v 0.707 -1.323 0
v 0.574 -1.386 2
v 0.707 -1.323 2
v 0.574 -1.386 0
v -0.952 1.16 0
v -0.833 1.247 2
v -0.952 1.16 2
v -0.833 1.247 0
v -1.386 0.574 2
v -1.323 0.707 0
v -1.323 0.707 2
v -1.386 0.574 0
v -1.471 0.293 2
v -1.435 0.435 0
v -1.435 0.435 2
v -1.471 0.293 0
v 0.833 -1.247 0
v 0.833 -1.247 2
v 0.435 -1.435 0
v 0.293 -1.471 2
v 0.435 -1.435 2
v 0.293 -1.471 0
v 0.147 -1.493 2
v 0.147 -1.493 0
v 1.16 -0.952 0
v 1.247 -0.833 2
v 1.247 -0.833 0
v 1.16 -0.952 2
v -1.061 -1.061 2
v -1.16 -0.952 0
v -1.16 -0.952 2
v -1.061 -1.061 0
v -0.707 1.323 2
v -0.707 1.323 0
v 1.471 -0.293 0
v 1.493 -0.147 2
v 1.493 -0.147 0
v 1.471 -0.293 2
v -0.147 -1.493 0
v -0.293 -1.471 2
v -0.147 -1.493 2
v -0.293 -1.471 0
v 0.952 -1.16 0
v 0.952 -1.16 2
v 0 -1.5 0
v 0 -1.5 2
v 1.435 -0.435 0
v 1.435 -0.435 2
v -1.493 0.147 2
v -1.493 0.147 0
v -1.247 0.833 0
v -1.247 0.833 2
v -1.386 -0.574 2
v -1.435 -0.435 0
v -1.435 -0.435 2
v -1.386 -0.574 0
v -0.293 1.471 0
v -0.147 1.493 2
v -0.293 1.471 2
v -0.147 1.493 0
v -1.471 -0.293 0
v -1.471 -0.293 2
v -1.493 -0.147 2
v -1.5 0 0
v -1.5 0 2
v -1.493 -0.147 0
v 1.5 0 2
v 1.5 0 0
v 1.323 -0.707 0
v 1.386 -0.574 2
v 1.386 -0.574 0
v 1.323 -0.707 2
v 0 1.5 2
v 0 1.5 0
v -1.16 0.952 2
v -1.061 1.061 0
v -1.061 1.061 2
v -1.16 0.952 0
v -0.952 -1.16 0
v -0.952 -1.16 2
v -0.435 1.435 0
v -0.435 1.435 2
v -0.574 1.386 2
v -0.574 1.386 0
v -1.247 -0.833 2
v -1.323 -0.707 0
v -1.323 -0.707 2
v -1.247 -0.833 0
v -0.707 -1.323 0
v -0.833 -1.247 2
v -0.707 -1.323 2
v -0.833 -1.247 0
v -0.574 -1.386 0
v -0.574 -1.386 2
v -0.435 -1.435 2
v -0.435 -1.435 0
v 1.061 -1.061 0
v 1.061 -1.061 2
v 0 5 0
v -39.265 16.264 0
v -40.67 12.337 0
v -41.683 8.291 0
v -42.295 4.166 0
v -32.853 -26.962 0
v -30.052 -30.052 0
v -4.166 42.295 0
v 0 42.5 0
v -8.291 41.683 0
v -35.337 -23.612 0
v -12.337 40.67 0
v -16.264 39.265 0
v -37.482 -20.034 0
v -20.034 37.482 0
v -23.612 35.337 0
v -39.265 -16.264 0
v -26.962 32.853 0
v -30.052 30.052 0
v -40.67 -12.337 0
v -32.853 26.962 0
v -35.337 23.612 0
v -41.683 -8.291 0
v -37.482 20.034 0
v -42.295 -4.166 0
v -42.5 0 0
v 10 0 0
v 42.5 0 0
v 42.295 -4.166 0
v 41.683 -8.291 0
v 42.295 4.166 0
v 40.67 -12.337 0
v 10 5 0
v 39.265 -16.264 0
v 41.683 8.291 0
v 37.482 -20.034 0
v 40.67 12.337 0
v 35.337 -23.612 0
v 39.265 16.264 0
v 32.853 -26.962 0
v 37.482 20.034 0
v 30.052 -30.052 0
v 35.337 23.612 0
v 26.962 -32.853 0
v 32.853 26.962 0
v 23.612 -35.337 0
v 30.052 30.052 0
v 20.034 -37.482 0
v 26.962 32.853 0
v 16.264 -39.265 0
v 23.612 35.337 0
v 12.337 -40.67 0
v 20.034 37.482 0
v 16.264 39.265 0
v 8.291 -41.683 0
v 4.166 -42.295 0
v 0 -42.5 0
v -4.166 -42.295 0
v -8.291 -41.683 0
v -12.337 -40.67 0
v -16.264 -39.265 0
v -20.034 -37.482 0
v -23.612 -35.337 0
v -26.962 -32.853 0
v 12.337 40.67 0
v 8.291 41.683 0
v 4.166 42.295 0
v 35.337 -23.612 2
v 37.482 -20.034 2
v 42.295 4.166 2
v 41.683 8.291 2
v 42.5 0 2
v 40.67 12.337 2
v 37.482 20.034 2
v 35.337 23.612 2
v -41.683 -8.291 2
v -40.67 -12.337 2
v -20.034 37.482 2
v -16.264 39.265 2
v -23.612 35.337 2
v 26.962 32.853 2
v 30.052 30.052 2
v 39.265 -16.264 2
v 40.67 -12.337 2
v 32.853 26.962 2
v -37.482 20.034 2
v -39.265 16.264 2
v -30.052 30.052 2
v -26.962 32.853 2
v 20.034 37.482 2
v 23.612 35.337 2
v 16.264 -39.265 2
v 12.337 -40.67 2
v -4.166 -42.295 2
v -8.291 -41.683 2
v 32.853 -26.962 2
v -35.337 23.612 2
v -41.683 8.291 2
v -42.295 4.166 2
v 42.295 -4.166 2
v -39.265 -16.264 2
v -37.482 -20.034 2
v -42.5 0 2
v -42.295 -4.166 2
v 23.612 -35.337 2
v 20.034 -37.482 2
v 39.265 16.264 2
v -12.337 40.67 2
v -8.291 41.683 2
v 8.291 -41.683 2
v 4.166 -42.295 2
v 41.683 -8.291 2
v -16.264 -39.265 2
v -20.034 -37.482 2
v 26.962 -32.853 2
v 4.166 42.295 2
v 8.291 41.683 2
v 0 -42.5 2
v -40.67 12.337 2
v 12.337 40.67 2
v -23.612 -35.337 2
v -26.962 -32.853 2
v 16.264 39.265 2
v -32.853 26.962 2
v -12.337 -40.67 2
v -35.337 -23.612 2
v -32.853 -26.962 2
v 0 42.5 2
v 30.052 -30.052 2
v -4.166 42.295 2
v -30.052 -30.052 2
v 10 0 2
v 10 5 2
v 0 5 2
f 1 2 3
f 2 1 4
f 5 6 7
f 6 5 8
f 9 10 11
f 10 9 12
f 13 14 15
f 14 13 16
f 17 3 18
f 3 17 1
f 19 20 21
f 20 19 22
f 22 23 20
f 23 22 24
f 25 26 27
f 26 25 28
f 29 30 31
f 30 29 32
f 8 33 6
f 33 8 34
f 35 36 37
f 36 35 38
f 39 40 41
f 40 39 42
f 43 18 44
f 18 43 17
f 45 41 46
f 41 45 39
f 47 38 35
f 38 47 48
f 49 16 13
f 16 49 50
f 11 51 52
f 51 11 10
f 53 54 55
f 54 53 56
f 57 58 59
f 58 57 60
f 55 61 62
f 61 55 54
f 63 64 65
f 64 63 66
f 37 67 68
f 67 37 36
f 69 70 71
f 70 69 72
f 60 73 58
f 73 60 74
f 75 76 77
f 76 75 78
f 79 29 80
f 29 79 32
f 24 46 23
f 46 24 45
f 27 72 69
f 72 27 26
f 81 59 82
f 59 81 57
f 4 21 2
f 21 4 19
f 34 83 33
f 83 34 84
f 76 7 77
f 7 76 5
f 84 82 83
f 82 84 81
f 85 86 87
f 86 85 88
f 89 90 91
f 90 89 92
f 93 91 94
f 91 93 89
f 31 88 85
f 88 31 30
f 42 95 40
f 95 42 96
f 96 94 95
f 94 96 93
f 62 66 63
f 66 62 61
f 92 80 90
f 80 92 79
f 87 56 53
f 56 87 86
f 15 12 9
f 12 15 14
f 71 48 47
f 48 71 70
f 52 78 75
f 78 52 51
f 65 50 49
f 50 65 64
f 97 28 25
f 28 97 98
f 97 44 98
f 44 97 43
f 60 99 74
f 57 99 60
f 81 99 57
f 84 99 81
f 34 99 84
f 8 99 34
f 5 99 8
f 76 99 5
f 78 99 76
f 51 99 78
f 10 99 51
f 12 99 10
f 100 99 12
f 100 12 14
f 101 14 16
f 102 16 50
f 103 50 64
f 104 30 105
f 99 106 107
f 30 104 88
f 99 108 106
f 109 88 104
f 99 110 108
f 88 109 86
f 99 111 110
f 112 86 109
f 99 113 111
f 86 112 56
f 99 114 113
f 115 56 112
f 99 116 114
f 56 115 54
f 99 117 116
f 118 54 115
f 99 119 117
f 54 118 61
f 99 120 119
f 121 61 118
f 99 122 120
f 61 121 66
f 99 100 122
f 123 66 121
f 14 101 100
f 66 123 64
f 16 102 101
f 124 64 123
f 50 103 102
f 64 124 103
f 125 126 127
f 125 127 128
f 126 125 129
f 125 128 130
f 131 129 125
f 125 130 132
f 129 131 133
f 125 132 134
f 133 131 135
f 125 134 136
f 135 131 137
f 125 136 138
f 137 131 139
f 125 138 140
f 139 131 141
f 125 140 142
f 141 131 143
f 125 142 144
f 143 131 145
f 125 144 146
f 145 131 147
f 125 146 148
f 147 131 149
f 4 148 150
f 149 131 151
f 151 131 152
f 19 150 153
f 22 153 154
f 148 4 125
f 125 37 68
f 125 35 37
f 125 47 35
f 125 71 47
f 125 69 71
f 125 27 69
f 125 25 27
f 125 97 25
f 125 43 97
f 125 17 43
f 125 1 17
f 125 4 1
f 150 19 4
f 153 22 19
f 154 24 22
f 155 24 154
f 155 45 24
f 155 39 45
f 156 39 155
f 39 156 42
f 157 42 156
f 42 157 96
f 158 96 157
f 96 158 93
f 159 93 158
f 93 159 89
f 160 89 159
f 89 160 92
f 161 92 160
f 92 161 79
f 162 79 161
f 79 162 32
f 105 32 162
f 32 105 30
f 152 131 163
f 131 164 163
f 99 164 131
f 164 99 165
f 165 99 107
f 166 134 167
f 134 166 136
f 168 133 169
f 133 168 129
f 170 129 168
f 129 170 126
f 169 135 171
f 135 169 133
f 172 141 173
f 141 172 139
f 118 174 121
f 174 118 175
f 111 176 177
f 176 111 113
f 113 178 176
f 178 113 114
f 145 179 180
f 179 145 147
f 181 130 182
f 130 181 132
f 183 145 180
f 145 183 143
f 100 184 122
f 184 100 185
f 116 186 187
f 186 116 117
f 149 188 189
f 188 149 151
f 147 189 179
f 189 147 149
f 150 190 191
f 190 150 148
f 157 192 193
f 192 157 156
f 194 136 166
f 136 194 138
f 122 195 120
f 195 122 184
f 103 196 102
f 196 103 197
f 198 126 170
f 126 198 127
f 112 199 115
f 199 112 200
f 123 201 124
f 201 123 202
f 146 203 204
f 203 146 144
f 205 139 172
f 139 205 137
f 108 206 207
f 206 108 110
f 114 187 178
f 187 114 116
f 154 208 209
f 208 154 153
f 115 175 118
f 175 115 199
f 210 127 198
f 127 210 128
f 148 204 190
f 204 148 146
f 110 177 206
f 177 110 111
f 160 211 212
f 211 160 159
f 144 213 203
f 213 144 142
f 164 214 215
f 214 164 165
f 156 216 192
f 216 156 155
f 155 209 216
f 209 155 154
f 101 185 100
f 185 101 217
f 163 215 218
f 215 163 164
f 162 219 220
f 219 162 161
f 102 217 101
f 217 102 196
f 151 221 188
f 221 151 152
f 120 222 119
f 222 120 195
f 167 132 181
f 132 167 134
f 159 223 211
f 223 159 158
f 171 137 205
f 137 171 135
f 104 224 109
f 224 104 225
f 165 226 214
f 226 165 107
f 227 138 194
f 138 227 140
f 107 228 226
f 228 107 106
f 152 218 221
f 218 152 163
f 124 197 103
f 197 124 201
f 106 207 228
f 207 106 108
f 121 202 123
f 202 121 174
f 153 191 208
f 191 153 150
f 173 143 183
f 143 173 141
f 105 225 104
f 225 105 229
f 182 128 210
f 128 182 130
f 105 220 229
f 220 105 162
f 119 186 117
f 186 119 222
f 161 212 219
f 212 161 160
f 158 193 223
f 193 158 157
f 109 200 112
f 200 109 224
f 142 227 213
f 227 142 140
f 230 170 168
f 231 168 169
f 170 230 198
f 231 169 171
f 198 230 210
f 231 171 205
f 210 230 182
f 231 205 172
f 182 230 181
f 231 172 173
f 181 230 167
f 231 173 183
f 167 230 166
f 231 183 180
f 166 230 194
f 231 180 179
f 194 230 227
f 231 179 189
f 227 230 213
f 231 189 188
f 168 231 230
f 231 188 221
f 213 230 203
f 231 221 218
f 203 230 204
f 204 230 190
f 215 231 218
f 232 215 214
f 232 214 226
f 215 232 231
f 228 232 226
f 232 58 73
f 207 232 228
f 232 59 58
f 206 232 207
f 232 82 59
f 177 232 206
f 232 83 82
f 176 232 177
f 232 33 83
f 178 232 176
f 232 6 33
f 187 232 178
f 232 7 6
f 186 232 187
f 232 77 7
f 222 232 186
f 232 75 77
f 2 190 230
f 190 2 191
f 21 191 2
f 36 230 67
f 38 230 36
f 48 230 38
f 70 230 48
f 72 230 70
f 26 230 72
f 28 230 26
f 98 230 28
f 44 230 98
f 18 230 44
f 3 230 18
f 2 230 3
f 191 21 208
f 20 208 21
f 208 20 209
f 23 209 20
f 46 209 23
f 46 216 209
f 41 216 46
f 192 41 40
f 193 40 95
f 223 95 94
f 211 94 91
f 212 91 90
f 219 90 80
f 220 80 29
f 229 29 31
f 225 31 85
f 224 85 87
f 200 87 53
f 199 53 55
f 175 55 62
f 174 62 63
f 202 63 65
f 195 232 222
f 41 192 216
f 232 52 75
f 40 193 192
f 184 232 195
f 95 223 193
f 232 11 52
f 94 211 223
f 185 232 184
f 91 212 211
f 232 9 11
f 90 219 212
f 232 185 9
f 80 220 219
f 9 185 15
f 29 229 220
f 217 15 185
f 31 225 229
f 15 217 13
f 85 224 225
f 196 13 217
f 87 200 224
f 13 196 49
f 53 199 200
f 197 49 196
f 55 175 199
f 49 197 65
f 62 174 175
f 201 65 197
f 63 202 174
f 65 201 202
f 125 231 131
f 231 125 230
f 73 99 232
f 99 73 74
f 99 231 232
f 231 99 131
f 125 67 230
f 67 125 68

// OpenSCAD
// --- Parameters (Dimensions in mm) ---
disc_diameter = 85;       // Diameter of the disc
disc_thickness = 2;       // Thickness of the disc
hole_diameter = 3;        // Diameter of the sowing holes
grid_spacing = 9;         // Center-to-center spacing of holes
grid_count = 7;           // Number of holes in X and Y directions

notch_width = 10;         // Width of the orientation notch (X)
notch_depth = 4;          // Depth of the notch from the rim (Y)

/* [Hidden] */
$fn = 64; // Smoothness for cylinders

// --- Implementation ---

// The part is modeled resting on the XY plane (Z=0)
// Centered on X and Y axes

difference() {
    // 1. Main Disc Body
    // Centered on X and Y, sitting on Z=0
    cylinder(h = disc_thickness, d = disc_diameter, center = false);

    // 2. The 7x7 Grid of Holes
    // Calculate the offset to center the grid on the disc
    // The grid span is (grid_count - 1) * grid_spacing
    grid_span = (grid_count - 1) * grid_spacing;
    grid_offset = grid_span / 2;

    for (i = [0 : grid_count - 1]) {
        for (j = [0 : grid_count - 1]) {
            // Calculate coordinates for each hole
            // Using explicit variables to avoid OpenSCAD scope warnings
            // and ensuring they are passed correctly to translate
            hx = (i * grid_spacing) - grid_offset;
            hy = (j * grid_spacing) - grid_offset;
            
            translate(x = hx, y = hy, z = -0.5)
            cylinder(h = disc_thickness + 1, d = hole_diameter);
        }
    }

    // 3. The Orientation Notch
    // Requirement: 10mm wide (X) and 4mm deep (Y, measured in from the rim)
    // The rim is at Y = disc_diameter / 2.
    // The notch is on the +Y side.
    // To be 4mm deep from the rim, the notch starts at Y = (disc_diameter/2 - 4)
    // and extends to the edge (disc_diameter/2).
    
    // We use a cube that is wider than the notch to ensure it cuts the edge cleanly.
    // We also extend it in Z to ensure a clean cut through the thickness.
    translate(x = -notch_width / 2, y = (disc_diameter / 2) - notch_depth, z = -0.5)
    cube([notch_width, notch_depth + 1, disc_thickness + 1]);
    
    // To ensure the notch is a clean rectangular cutout that removes the rim 
    // at the +Y side, we also subtract a block that covers the full width 
    // of the notch area to prevent "slivers" of material at the edge.
    // This ensures the bounding box Y max is exactly disc_diameter/2.
    translate(x = -notch_width / 2, y = (disc_diameter / 2) - notch_depth, z = -0.5)
    cube([notch_width, notch_depth + 1, disc_thickness + 1]);
}

// Note on the Notch:
// The notch is centered on the X axis (from -5 to +5).
// It is located on the +Y side.
// It is 4mm deep from the rim.
// This means the notch occupies the Y range [38.5, 42.5].
// The bounding box should reflect the disc diameter (85) and the notch depth.
